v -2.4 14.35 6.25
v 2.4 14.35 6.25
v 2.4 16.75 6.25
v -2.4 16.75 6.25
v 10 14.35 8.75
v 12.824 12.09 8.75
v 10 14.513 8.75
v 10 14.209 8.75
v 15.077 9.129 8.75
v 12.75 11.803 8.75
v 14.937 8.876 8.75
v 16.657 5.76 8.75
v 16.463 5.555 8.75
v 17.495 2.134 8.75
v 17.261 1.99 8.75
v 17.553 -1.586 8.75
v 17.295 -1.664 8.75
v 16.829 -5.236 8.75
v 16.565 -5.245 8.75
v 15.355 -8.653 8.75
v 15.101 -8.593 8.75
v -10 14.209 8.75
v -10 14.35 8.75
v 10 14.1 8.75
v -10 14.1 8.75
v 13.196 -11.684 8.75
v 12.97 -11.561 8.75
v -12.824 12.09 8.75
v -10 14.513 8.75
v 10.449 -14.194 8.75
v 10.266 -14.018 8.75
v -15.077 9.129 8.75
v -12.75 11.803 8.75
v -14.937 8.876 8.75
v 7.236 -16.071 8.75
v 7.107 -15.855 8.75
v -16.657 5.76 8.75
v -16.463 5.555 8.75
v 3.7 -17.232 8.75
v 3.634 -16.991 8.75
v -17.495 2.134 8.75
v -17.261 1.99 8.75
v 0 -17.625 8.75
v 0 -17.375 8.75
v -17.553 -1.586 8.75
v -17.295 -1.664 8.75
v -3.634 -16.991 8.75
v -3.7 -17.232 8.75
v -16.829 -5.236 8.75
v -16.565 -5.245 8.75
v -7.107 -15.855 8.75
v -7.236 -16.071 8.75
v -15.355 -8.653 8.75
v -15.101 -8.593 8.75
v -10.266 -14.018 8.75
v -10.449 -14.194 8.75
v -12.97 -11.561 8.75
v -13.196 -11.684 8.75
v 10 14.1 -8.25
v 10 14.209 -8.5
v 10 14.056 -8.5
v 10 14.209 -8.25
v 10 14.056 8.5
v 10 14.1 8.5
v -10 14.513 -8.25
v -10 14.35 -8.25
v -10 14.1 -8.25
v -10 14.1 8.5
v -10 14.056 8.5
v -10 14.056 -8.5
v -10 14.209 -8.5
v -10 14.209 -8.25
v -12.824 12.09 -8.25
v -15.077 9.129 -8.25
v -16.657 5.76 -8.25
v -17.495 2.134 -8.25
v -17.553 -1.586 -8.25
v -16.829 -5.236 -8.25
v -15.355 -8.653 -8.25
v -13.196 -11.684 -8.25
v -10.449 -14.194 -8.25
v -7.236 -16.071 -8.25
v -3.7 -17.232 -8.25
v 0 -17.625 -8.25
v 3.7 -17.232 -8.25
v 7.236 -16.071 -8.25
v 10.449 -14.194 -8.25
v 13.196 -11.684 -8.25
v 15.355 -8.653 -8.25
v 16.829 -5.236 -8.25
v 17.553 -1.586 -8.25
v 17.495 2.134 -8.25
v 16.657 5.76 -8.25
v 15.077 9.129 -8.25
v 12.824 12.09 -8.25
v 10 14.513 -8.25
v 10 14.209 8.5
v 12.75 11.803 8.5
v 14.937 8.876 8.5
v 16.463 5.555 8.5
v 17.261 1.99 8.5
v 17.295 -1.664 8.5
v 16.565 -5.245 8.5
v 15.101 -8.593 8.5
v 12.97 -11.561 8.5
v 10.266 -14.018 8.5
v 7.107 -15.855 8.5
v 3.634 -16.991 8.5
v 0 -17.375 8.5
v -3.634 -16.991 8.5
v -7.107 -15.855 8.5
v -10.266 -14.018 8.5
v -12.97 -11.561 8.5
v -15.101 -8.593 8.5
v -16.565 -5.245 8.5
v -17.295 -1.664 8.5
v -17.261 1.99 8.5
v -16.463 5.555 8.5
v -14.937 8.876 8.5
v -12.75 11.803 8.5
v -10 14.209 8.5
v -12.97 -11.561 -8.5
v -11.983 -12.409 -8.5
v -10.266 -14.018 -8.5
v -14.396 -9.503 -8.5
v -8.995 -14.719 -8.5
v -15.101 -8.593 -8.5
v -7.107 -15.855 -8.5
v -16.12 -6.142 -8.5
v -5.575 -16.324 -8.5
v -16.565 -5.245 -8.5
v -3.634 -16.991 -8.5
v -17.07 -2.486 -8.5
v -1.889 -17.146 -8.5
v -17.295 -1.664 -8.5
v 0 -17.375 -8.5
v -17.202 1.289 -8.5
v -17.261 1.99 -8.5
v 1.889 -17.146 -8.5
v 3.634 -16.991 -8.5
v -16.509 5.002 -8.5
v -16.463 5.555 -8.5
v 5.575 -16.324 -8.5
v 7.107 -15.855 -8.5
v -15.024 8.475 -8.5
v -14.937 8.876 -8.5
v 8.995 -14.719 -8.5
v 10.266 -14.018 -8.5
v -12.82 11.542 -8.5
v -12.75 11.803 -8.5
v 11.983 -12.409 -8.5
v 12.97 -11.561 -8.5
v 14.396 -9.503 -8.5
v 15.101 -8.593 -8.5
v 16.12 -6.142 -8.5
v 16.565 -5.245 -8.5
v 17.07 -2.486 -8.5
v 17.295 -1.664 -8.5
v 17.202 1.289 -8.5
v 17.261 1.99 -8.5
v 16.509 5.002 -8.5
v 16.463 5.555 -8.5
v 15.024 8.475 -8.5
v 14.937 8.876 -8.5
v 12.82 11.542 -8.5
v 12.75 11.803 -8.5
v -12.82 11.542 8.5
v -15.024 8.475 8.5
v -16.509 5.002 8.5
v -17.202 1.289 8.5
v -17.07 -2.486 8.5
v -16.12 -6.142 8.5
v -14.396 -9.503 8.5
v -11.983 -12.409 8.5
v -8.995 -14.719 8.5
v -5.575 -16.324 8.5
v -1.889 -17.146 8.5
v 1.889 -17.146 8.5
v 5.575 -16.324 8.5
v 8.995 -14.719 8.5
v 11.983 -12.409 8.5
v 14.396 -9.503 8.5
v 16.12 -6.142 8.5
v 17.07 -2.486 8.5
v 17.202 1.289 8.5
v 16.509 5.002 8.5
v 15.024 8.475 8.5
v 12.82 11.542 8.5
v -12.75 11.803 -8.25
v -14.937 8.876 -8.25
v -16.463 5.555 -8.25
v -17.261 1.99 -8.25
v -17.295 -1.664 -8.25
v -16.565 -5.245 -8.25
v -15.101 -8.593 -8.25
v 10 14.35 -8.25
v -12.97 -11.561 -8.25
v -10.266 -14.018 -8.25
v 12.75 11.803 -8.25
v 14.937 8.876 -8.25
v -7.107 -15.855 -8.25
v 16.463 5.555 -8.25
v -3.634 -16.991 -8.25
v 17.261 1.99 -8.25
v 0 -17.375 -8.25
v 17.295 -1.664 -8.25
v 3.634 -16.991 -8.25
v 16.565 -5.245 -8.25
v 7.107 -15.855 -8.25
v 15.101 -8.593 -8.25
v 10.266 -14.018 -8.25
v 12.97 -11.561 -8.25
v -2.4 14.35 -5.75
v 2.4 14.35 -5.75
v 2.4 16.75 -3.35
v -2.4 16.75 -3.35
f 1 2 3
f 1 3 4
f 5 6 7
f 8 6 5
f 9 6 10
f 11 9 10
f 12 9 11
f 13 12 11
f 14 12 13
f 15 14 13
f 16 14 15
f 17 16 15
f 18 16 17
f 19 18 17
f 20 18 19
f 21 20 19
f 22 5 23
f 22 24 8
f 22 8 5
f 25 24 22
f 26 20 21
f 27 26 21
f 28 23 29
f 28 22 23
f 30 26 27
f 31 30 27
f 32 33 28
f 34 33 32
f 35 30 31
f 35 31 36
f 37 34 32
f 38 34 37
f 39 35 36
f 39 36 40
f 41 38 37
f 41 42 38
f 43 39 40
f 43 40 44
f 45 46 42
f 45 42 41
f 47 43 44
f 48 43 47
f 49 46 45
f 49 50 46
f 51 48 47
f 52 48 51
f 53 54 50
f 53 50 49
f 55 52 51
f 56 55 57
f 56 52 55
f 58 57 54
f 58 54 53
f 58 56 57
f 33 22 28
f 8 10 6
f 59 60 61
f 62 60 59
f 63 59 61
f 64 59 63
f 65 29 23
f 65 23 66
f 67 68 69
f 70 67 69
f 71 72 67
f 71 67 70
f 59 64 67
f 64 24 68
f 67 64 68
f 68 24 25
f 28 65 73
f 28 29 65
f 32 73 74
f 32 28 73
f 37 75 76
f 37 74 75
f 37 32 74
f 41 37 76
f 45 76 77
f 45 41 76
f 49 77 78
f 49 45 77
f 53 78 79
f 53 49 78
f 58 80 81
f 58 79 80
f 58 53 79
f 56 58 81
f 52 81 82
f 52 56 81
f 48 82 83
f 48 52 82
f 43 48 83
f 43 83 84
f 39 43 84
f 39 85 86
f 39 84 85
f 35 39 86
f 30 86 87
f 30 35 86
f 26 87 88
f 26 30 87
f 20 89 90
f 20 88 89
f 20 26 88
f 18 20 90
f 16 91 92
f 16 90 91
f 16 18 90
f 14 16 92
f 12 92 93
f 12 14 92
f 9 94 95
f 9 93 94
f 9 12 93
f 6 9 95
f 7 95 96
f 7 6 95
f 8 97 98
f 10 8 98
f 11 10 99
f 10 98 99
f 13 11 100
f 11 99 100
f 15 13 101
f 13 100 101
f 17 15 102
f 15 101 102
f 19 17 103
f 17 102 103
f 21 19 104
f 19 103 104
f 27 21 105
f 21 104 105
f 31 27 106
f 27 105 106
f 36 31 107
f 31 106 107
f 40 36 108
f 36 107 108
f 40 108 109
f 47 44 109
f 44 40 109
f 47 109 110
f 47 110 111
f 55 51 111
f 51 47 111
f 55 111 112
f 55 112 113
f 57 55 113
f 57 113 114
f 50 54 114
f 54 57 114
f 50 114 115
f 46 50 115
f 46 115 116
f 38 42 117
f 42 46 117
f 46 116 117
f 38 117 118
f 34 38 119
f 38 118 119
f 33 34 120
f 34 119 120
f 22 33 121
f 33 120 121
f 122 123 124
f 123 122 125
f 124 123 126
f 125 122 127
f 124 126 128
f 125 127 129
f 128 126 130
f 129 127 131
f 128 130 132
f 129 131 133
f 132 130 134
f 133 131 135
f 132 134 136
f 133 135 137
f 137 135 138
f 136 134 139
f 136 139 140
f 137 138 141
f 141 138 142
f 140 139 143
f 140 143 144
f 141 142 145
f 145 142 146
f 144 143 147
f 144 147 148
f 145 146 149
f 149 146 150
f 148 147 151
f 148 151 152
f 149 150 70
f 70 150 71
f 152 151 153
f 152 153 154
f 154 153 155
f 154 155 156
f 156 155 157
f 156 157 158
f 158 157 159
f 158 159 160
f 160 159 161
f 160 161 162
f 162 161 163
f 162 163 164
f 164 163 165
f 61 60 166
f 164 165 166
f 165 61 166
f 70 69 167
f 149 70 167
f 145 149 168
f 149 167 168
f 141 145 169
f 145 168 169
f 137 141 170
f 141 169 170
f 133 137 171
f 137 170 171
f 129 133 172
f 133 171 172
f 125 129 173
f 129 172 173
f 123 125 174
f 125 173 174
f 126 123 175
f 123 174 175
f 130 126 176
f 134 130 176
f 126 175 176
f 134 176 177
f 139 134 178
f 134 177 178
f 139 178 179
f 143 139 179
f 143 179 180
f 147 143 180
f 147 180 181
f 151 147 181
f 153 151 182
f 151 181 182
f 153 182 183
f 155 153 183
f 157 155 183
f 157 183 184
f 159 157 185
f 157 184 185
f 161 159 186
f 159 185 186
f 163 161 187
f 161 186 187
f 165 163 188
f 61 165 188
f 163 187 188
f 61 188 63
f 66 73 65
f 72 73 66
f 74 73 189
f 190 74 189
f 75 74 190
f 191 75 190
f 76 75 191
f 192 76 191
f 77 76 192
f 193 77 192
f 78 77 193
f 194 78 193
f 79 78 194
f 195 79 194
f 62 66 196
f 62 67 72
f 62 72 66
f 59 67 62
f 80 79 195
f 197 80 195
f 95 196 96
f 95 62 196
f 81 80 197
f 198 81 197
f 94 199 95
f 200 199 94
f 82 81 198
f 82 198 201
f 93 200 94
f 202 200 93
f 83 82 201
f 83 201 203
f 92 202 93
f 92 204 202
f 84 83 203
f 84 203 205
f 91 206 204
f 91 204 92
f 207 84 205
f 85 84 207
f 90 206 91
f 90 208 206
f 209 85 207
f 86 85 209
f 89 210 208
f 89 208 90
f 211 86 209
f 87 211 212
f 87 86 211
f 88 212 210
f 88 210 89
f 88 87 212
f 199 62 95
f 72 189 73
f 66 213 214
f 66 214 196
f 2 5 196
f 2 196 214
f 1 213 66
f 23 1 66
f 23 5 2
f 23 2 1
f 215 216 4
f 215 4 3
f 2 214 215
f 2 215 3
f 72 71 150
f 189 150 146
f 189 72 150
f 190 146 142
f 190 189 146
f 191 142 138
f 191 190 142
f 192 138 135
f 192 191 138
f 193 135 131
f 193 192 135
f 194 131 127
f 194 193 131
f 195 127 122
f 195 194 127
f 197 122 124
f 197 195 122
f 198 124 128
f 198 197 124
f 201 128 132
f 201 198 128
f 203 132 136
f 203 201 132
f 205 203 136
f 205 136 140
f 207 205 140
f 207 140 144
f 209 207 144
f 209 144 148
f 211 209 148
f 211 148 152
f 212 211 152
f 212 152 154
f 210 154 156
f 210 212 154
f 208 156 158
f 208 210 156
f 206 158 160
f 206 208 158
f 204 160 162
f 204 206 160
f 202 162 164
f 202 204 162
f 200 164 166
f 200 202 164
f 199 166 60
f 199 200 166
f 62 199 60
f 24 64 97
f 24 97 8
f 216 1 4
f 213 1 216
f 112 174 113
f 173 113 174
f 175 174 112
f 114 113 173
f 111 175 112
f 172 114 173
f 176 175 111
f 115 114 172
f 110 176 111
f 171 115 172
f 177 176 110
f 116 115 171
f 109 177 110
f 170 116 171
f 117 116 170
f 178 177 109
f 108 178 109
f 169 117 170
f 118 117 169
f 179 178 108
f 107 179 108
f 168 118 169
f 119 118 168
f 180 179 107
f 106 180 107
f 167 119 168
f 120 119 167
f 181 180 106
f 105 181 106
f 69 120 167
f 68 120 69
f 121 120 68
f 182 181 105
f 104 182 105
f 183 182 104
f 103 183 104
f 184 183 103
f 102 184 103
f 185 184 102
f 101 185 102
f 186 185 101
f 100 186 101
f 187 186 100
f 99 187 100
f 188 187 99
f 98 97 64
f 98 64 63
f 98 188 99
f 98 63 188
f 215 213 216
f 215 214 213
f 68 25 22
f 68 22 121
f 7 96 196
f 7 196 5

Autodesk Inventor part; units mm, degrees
ref_plane "YZ Plane" through (0, 0, 0) normal (1, 0, 0) x (0, 1, 0)
sketch "Sketch1" plane through (0, 0, 0) normal (0, 0, 1) x (1, 0, 0)
  circle A0 centre (0, 0) radius 17.25
  circle A1 centre (0, 0) radius 17.375
  dimension "d0" = 34.5
  dimension "d1" = 34.75
extrude "Extrusion1" add sketch "Sketch1" along normal mid plane 17
sketch "Sketch2" plane through (0, 0, 0) normal (0, 0, 1) x (1, 0, 0)
  circle A0 centre (0, 0) radius 17.375
  circle A1 centre (0, 0) radius 17.625
  dimension "d4" = 34.75
  dimension "d5" = 0.25
extrude "Extrusion2" add sketch "Sketch2" along normal blind 8.75 and the other way blind 8.25
ref_plane "Work Plane1" through (0, 17.625, 0) normal (0, 1, 0) x (-1, 0, 0)
sketch "Sketch3" plane through (0, 17.625, 0) normal (0, 1, 0) x (-1, 0, 0)
  line L0 (10, 0) -> (10, -8.5)
  line L1 (10, -8.5) -> (0, -8.5)
  line L2 (-10, 0) -> (-10, 9.4902)
  line L3 (-10, 9.4902) -> (-0.099, 9.4902)
  line L4 (10, -8.5) -> (-10, -8.5)
  line L5 (-10, -8.5) -> (-10, 9.4902)
  line L6 (-10, 9.4902) -> (10, 9.4902)
  line L7 (10, 9.4902) -> (10, -8.5)
  point P0 (0, 0)
  point P1 (-0.099, 9.4902)
  dimension "d10" = 10
  dimension "d11" = 10
extrude "Extrusion3" cut sketch "Sketch3" against normal blind 8.75
ref_plane "Work Plane2" through (0, 14.1, 0) normal (0, 1, 0) x (-1, 0, 0)
sketch "Sketch4" plane through (0, 14.1, 0) normal (0, 1, 0) x (-1, 0, 0)
  line L0 (-10, -8.25) -> (-10, 8.75) projected
  line L1 (10, -8.25) -> (-10, -8.25)
  line L2 (-10, -8.25) -> (-10, 8.75)
  line L3 (-10, 8.75) -> (10, 8.75)
  line L4 (10, 8.75) -> (10, -8.25)
  point P0 (0, 0)
extrude "Extrusion4" add sketch "Sketch4" along normal blind 0.25
sketch "Sketch5" plane through (0, 14.35, 0) normal (0, 1, 0) x (1, 0, 0)
  line L0 (-2.4, 5.75) -> (2.4, 5.75)
  line L1 (2.4, 5.75) -> (2.4, -6.25)
  line L2 (2.4, -6.25) -> (-2.4, -6.25)
  line L3 (-2.4, -6.25) -> (-2.4, 5.75)
  line L4 (10, 8.25) -> (-10, 8.25) projected
  line L5 (10, 8.25) -> (10, -8.75) projected
  point P0 (0, 0)
  dimension "d17" = 4.8
  dimension "d18" = 12
  dimension "d19" = 2.5
  dimension "d20" = 7.6
extrude "Extrusion5" add sketch "Sketch5" along normal blind 2.4
sketch "Sketch6" plane through (2.4, 14.35, 6.25) normal (1, 0, 0) x (0, 0, -1)
  line L0 (12, 0) -> (12, 2.4) projected
  line L1 (12, 0) -> (9.6, 2.4)
  line L2 (12, 2.4) -> (0, 2.4) projected
  line L3 (12, 0) -> (15.3941, 0) construction
  line L4 (9.6, 2.4) -> (12, 2.4)
  line L5 (12, 2.4) -> (12, 0)
  point P0 (6.25, -14.35)
  dimension "d23" = 135
extrude "Extrusion6" cut sketch "Sketch6" against normal blind 4.8
properties part number "Large_Ring"
